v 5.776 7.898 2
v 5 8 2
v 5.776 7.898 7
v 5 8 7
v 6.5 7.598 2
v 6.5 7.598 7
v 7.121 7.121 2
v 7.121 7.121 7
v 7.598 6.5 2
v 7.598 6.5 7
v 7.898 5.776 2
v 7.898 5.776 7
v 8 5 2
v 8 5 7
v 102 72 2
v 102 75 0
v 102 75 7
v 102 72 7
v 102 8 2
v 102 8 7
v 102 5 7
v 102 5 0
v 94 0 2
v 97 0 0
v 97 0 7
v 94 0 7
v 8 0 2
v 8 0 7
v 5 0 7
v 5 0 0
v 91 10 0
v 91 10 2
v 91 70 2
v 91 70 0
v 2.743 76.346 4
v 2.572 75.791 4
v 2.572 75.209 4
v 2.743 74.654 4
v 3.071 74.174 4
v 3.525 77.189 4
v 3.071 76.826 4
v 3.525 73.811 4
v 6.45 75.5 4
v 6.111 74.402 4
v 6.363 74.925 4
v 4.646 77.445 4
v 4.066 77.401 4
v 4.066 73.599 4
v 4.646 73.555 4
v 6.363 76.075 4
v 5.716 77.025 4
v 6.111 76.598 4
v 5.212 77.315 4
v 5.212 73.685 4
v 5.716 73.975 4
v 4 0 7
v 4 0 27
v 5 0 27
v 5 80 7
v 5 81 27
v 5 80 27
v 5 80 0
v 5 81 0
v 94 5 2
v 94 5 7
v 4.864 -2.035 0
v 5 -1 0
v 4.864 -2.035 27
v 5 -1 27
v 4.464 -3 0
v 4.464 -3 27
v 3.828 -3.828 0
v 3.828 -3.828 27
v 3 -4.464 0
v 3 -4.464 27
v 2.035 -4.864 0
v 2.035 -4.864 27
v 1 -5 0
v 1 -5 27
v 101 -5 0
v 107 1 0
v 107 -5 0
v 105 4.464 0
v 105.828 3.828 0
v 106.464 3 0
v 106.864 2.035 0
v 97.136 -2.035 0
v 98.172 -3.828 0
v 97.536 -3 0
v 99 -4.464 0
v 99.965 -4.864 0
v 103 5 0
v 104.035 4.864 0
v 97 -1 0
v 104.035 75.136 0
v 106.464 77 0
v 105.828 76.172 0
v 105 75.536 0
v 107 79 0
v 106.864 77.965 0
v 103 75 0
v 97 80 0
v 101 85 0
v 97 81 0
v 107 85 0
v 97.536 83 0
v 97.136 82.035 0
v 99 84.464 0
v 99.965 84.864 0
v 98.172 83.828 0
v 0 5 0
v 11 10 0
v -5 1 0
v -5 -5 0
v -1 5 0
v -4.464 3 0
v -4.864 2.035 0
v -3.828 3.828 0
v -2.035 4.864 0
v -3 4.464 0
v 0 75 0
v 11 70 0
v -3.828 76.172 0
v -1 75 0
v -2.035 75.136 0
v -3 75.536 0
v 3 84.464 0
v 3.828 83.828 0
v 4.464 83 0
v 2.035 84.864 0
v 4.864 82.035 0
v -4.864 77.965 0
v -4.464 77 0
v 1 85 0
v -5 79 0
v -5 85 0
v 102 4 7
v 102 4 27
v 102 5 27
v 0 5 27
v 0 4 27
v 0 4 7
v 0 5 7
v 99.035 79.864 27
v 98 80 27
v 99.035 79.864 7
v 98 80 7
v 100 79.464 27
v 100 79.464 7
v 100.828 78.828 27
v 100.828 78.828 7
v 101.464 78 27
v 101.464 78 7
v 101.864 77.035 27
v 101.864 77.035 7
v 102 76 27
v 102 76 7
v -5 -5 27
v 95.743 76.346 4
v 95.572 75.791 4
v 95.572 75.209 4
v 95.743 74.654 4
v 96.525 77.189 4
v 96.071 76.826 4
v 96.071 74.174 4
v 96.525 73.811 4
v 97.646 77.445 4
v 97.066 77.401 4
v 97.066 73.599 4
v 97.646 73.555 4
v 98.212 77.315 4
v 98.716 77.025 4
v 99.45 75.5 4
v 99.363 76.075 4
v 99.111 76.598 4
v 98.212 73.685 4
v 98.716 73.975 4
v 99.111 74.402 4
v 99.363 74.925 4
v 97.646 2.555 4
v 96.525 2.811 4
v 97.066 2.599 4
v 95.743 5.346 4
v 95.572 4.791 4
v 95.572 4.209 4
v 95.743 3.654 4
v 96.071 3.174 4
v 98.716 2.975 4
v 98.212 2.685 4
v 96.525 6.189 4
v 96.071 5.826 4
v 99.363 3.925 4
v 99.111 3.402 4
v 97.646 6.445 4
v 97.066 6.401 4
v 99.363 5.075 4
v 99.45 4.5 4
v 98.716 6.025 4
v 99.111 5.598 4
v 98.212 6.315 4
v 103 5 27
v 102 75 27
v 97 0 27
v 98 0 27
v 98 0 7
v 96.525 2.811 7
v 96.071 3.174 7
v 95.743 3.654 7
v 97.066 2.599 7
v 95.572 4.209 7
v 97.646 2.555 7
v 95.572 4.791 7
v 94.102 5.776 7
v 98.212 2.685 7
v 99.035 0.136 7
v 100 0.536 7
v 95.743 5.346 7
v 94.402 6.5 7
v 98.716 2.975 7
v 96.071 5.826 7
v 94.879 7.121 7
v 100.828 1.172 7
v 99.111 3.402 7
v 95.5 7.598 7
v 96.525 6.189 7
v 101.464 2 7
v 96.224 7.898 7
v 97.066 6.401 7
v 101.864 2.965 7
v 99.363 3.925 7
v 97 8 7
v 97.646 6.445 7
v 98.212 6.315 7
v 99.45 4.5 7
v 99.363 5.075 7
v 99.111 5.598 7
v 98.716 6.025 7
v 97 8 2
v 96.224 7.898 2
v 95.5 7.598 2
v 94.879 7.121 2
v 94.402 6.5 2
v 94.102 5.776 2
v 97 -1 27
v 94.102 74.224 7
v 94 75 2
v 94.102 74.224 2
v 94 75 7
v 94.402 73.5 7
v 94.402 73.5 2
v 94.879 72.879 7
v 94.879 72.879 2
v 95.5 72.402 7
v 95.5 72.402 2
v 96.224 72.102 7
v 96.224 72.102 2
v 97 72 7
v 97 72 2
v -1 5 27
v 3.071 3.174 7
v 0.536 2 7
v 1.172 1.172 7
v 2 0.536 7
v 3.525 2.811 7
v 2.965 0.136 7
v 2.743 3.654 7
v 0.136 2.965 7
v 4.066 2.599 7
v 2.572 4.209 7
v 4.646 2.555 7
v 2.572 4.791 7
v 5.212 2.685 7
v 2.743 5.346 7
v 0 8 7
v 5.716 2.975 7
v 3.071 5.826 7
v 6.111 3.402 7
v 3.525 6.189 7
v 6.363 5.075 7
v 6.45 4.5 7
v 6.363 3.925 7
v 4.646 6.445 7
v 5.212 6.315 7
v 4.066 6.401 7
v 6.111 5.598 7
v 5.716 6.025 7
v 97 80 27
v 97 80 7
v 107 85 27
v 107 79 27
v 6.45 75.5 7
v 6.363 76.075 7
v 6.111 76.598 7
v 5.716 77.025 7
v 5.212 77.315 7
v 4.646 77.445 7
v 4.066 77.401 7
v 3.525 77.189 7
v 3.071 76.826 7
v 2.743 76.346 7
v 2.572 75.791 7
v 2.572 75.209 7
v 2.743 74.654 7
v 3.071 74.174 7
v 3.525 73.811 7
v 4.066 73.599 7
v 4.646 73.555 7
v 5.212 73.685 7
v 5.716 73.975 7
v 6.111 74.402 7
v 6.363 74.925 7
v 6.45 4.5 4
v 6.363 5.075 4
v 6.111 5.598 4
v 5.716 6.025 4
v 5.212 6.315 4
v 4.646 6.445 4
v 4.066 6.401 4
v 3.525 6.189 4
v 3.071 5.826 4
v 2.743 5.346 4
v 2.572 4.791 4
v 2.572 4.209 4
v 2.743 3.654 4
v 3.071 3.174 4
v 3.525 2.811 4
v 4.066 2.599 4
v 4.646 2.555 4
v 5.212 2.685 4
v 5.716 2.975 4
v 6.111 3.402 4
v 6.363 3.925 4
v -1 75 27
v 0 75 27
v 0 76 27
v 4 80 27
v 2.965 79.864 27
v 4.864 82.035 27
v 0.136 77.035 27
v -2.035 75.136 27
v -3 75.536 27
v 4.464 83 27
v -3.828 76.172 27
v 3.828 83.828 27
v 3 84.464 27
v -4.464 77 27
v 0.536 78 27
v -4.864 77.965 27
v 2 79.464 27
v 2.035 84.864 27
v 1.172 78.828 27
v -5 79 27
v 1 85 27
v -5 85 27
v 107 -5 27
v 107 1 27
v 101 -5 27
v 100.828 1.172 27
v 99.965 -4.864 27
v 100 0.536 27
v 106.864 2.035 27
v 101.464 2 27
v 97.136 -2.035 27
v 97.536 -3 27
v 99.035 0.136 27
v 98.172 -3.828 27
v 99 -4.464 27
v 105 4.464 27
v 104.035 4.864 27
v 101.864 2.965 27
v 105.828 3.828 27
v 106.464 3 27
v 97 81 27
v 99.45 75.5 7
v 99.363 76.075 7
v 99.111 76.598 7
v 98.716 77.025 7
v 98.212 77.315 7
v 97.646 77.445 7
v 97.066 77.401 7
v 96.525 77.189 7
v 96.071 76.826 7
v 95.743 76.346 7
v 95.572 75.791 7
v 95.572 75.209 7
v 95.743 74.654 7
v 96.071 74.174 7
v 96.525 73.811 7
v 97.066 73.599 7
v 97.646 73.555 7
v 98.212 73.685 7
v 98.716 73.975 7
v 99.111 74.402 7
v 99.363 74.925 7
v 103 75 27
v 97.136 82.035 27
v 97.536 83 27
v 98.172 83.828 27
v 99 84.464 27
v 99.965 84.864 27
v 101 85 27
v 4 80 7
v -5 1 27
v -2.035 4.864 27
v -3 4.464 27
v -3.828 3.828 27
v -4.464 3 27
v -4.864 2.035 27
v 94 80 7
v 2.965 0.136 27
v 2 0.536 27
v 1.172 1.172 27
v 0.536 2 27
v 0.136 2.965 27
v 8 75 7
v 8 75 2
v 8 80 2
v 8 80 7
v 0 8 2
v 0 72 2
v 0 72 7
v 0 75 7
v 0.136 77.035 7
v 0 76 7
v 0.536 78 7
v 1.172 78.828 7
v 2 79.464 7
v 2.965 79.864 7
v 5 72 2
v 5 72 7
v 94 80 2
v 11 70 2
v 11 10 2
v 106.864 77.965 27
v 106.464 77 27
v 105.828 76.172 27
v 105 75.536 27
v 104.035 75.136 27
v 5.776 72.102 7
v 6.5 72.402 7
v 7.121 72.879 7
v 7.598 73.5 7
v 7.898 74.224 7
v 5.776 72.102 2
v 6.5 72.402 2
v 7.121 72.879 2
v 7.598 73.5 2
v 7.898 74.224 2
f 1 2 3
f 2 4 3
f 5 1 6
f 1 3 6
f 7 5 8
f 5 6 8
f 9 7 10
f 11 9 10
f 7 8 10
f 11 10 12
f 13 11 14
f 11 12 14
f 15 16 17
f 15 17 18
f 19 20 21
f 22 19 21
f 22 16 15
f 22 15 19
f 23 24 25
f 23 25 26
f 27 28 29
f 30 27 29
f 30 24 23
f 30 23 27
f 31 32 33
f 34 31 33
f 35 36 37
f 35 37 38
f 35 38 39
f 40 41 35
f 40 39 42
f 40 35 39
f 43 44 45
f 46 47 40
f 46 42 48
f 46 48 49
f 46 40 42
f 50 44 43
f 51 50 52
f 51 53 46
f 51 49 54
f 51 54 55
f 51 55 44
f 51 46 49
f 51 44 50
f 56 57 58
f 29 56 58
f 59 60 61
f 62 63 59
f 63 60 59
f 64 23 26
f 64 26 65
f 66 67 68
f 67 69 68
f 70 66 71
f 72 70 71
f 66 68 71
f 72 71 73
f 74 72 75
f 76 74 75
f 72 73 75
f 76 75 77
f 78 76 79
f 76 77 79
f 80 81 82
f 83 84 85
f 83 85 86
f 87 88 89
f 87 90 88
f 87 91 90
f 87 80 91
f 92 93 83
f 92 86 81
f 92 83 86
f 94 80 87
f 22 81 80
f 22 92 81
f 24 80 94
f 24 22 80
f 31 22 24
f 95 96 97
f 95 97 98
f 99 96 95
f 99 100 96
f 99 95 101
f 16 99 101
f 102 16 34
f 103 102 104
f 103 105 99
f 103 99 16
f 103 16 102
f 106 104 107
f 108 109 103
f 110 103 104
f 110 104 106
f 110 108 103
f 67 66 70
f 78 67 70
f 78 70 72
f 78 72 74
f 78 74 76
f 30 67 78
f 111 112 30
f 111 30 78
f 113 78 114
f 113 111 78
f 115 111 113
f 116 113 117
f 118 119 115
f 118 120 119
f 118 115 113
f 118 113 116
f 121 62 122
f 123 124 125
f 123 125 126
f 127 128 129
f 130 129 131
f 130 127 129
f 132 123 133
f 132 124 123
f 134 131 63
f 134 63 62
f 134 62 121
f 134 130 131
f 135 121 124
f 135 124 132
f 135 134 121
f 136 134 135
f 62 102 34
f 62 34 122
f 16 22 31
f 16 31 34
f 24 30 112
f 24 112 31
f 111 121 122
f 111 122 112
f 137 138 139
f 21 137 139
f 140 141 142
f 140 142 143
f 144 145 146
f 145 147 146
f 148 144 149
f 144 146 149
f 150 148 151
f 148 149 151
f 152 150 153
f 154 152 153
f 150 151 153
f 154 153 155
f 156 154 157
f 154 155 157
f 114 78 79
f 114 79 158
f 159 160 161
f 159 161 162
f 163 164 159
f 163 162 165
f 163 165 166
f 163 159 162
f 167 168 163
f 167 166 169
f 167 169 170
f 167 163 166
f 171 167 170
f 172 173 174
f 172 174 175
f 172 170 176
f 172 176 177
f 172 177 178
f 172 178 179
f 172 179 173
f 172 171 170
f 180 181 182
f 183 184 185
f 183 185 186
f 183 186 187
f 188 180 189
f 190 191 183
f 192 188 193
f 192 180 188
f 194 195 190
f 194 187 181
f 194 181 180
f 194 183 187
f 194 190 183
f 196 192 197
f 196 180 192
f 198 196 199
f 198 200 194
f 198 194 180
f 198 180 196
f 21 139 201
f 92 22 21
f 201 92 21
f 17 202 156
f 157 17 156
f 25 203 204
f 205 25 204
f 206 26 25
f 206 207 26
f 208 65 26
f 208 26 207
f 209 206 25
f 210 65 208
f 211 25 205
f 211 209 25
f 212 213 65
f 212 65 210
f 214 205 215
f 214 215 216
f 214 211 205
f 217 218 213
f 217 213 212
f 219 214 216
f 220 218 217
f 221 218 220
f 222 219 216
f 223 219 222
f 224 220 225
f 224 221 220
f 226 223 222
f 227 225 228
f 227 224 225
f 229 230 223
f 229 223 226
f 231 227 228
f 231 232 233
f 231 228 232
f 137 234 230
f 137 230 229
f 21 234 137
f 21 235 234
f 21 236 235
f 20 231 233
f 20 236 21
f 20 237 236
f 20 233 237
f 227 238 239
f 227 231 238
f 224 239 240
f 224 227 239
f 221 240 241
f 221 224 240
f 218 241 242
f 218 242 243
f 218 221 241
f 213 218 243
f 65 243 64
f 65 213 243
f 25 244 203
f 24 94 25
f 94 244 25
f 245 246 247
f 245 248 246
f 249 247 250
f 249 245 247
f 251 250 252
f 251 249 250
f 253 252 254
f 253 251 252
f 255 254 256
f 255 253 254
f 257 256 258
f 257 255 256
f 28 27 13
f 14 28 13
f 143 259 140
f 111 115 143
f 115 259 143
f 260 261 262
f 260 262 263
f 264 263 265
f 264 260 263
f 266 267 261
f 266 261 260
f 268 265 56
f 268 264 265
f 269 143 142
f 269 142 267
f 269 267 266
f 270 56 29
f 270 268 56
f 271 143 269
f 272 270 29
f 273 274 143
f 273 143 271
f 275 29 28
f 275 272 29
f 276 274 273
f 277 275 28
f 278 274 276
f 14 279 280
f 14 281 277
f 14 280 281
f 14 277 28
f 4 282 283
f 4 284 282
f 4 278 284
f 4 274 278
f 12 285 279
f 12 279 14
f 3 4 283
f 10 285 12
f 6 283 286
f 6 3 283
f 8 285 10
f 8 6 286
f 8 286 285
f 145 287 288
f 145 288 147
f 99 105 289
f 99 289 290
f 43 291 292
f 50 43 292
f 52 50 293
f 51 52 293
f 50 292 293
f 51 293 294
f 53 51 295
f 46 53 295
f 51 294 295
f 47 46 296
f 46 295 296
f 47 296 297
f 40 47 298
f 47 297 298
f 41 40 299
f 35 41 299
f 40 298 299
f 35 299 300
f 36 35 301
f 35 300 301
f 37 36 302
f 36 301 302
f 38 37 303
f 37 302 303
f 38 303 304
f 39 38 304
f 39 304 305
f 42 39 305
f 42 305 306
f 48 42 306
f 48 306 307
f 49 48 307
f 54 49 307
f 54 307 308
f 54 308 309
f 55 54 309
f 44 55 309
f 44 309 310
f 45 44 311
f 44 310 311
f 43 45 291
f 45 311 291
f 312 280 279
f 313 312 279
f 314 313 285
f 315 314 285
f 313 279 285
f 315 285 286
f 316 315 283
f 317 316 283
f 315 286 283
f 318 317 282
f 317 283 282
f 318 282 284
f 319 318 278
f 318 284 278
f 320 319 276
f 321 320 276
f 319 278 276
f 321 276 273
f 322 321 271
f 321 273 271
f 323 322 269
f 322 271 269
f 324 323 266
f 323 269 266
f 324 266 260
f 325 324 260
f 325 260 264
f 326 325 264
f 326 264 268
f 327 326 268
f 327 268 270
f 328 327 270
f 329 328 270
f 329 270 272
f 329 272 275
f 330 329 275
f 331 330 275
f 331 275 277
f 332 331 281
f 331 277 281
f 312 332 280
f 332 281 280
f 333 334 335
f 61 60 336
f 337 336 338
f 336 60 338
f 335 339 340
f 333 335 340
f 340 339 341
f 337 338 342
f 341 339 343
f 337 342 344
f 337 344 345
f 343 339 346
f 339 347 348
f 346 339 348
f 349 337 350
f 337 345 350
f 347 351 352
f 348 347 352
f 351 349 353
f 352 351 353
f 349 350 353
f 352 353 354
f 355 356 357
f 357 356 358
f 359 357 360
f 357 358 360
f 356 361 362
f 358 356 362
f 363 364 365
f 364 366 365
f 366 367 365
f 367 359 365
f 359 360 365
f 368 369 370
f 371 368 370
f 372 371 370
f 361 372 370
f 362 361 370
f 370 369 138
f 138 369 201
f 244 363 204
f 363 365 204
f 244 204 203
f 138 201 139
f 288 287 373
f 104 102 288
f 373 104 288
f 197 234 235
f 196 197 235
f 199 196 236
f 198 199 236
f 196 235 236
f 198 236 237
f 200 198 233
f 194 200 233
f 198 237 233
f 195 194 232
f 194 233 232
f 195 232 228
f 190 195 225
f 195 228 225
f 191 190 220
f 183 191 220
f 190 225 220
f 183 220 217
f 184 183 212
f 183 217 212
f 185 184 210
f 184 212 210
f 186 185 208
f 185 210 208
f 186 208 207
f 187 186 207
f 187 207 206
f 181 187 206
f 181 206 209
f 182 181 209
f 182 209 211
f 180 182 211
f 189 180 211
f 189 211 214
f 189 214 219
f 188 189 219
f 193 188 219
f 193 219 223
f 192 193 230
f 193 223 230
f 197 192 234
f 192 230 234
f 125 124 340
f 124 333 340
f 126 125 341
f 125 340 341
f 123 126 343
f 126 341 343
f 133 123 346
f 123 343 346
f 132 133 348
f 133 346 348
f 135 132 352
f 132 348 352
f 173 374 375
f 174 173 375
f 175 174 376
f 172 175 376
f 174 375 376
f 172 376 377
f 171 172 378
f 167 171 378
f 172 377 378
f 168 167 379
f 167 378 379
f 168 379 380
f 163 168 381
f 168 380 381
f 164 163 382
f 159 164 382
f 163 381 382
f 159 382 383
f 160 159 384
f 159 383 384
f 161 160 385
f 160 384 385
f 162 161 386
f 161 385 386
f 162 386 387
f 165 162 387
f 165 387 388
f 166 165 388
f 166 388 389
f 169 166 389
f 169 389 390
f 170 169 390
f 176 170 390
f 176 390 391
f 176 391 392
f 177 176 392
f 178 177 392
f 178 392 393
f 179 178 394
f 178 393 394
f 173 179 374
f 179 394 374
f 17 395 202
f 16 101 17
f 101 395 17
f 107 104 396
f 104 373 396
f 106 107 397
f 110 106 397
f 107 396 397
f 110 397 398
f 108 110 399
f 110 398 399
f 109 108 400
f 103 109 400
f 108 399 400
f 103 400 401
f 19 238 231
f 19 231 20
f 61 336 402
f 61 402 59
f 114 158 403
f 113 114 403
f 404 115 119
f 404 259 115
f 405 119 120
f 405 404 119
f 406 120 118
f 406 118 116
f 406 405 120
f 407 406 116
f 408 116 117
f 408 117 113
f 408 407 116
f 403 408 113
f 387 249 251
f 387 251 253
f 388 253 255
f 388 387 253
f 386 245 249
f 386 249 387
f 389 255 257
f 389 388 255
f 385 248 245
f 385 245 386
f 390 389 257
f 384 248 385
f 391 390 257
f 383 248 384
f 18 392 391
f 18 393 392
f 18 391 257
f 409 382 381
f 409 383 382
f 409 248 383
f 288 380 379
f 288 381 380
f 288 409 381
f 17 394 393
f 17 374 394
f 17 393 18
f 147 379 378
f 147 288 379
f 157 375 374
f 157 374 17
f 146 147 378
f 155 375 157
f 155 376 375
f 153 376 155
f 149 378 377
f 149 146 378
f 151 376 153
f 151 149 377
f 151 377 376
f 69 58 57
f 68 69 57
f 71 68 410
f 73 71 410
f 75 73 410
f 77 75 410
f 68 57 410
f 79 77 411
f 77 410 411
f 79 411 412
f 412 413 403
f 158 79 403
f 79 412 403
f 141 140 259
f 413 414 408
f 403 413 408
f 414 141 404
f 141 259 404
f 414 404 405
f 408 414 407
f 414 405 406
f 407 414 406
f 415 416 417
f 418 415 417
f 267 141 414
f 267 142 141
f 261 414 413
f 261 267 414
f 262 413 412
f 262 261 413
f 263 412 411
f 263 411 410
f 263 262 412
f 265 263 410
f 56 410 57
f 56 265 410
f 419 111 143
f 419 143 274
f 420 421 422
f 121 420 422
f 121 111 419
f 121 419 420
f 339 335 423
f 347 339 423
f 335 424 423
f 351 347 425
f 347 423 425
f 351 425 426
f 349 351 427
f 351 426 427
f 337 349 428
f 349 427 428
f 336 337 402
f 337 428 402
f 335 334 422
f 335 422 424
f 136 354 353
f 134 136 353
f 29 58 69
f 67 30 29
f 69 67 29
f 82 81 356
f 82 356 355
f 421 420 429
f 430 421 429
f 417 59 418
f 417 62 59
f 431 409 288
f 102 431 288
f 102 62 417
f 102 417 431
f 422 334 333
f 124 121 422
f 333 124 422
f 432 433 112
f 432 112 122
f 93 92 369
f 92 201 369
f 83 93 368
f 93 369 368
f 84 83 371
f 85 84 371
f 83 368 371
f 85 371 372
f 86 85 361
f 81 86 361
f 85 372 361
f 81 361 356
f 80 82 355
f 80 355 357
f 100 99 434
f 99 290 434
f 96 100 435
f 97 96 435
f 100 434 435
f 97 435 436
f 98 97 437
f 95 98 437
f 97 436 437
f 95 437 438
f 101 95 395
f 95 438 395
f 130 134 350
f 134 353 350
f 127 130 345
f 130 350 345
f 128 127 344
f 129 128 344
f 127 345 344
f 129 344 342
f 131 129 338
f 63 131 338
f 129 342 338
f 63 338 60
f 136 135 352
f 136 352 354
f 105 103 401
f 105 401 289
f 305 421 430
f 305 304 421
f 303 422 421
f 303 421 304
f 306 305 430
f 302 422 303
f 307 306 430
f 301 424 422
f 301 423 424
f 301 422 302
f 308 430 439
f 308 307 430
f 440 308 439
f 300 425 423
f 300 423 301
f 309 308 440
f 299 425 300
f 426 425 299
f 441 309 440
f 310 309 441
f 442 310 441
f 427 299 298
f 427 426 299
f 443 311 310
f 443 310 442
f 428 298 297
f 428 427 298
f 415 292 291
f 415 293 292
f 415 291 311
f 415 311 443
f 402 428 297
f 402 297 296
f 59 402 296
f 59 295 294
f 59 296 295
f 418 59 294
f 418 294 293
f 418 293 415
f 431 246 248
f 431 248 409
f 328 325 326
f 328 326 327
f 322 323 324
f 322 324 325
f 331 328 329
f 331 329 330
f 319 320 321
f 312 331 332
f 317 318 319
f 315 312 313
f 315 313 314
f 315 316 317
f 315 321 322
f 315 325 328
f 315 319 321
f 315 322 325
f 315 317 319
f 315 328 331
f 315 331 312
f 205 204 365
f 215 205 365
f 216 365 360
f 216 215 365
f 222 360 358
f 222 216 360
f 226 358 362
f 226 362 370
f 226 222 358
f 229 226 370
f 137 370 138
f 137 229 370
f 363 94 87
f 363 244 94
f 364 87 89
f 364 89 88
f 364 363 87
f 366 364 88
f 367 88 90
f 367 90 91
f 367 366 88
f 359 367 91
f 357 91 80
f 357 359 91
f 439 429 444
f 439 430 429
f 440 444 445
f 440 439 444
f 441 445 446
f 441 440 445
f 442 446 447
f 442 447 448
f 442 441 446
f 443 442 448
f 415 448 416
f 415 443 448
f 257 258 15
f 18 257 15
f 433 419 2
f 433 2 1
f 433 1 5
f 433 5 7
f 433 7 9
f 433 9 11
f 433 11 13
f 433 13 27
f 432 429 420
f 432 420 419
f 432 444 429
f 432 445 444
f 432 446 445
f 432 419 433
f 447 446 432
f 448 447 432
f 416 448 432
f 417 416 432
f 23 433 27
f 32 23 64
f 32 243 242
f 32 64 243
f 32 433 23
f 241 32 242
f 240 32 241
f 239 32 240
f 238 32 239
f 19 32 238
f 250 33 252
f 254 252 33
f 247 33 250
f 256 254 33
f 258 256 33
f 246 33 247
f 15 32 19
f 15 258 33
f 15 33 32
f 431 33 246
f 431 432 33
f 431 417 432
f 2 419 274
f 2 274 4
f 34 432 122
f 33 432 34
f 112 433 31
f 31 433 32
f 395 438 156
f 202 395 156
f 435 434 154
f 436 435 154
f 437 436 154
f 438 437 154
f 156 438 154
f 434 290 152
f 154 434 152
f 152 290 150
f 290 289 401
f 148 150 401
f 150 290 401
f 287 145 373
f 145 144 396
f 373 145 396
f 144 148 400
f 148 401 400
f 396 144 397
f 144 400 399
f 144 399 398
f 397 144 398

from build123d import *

# Parameters (mm, degrees)
BOSS_EXTRUDE2_DEPTH = 27
SKETCH3_W           = 102
SKETCH3_H           = 80
CUT_EXTRUDE2_DEPTH  = 25
SKETCH4_W           = 8
SKETCH4_H           = 8
BOSS_EXTRUDE3_DEPTH = 5
SKETCH7_R           = 1.95
CUT_EXTRUDE3_DEPTH  = 3
FILLET2_R           = 3
FILLET3_R           = 4
SKETCH8_W           = 80
SKETCH8_H           = 60
CUT_EXTRUDE4_DEPTH  = 3


with BuildPart() as part:
    # Sketch1 → Boss-Extrude2 (new body)
    with BuildSketch(Plane.XY):
        Polygon((0, 75), (-5, 75), (-5, 85), (5, 85), (5, 80), (97, 80), (97, 85), (107, 85), (107, 75), (102, 75), (102, 5), (107, 5), (107, -5), (97, -5), (97, 0), (5, 0), (5, -5), (-5, -5), (-5, 5), (0, 5), align=None)
    extrude(amount=BOSS_EXTRUDE2_DEPTH)

    # Sketch3 → Cut-Extrude2 (cut)
    with BuildSketch(Plane.XY.offset(27)):
        with Locations((51, 40)):
            Rectangle(SKETCH3_W, SKETCH3_H)
    extrude(amount=-CUT_EXTRUDE2_DEPTH, mode=Mode.SUBTRACT)

    # Sketch4 → Boss-Extrude3 (add)
    with BuildSketch(Plane.XY.offset(2)):
        with Locations((4, 76)):
            Rectangle(SKETCH4_W, SKETCH4_H)
        with Locations((98, 76)):
            Rectangle(SKETCH4_W, SKETCH4_H)
        with Locations((98, 4)):
            Rectangle(SKETCH4_W, SKETCH4_H)
        with Locations((4, 4)):
            Rectangle(SKETCH4_W, SKETCH4_H)
    extrude(amount=BOSS_EXTRUDE3_DEPTH)

    # Sketch7 → Cut-Extrude3 (cut)
    with BuildSketch(Plane.XY.offset(7)):
        with Locations((4.5, 75.5)):
            Circle(SKETCH7_R)
        with Locations((97.5, 75.5)):
            Circle(SKETCH7_R)
        with Locations((97.5, 4.5)):
            Circle(SKETCH7_R)
        with Locations((4.5, 4.5)):
            Circle(SKETCH7_R)
    extrude(amount=-CUT_EXTRUDE3_DEPTH, mode=Mode.SUBTRACT)

    # Fillet2
    fillet2_edges = [part.edges().sort_by_distance(p)[0] for p in [
        (94, 72, 4.5),
        (94, 8, 4.5),
        (8, 8, 4.5),
        (8, 72, 4.5),
    ]]
    fillet(fillet2_edges, radius=FILLET2_R)

    # Fillet3
    fillet3_edges = [part.edges().sort_by_distance(p)[0] for p in [
        (102, 80, 17),
        (102, 0, 17),
        (0, 0, 17),
        (-5, 75, 13.5),
        (5, 85, 13.5),
        (97, 85, 13.5),
        (107, 75, 13.5),
        (107, 5, 13.5),
        (97, -5, 13.5),
        (5, -5, 13.5),
        (-5, 5, 13.5),
        (0, 80, 17),
    ]]
    fillet(fillet3_edges, radius=FILLET3_R)

    # Sketch8 → Cut-Extrude4 (cut, through all)
    with BuildSketch(Plane.XY.offset(2)):
        with Locations((51, 40)):
            Rectangle(SKETCH8_W, SKETCH8_H)
    extrude(amount=-CUT_EXTRUDE4_DEPTH, mode=Mode.SUBTRACT)


solid = part.part
